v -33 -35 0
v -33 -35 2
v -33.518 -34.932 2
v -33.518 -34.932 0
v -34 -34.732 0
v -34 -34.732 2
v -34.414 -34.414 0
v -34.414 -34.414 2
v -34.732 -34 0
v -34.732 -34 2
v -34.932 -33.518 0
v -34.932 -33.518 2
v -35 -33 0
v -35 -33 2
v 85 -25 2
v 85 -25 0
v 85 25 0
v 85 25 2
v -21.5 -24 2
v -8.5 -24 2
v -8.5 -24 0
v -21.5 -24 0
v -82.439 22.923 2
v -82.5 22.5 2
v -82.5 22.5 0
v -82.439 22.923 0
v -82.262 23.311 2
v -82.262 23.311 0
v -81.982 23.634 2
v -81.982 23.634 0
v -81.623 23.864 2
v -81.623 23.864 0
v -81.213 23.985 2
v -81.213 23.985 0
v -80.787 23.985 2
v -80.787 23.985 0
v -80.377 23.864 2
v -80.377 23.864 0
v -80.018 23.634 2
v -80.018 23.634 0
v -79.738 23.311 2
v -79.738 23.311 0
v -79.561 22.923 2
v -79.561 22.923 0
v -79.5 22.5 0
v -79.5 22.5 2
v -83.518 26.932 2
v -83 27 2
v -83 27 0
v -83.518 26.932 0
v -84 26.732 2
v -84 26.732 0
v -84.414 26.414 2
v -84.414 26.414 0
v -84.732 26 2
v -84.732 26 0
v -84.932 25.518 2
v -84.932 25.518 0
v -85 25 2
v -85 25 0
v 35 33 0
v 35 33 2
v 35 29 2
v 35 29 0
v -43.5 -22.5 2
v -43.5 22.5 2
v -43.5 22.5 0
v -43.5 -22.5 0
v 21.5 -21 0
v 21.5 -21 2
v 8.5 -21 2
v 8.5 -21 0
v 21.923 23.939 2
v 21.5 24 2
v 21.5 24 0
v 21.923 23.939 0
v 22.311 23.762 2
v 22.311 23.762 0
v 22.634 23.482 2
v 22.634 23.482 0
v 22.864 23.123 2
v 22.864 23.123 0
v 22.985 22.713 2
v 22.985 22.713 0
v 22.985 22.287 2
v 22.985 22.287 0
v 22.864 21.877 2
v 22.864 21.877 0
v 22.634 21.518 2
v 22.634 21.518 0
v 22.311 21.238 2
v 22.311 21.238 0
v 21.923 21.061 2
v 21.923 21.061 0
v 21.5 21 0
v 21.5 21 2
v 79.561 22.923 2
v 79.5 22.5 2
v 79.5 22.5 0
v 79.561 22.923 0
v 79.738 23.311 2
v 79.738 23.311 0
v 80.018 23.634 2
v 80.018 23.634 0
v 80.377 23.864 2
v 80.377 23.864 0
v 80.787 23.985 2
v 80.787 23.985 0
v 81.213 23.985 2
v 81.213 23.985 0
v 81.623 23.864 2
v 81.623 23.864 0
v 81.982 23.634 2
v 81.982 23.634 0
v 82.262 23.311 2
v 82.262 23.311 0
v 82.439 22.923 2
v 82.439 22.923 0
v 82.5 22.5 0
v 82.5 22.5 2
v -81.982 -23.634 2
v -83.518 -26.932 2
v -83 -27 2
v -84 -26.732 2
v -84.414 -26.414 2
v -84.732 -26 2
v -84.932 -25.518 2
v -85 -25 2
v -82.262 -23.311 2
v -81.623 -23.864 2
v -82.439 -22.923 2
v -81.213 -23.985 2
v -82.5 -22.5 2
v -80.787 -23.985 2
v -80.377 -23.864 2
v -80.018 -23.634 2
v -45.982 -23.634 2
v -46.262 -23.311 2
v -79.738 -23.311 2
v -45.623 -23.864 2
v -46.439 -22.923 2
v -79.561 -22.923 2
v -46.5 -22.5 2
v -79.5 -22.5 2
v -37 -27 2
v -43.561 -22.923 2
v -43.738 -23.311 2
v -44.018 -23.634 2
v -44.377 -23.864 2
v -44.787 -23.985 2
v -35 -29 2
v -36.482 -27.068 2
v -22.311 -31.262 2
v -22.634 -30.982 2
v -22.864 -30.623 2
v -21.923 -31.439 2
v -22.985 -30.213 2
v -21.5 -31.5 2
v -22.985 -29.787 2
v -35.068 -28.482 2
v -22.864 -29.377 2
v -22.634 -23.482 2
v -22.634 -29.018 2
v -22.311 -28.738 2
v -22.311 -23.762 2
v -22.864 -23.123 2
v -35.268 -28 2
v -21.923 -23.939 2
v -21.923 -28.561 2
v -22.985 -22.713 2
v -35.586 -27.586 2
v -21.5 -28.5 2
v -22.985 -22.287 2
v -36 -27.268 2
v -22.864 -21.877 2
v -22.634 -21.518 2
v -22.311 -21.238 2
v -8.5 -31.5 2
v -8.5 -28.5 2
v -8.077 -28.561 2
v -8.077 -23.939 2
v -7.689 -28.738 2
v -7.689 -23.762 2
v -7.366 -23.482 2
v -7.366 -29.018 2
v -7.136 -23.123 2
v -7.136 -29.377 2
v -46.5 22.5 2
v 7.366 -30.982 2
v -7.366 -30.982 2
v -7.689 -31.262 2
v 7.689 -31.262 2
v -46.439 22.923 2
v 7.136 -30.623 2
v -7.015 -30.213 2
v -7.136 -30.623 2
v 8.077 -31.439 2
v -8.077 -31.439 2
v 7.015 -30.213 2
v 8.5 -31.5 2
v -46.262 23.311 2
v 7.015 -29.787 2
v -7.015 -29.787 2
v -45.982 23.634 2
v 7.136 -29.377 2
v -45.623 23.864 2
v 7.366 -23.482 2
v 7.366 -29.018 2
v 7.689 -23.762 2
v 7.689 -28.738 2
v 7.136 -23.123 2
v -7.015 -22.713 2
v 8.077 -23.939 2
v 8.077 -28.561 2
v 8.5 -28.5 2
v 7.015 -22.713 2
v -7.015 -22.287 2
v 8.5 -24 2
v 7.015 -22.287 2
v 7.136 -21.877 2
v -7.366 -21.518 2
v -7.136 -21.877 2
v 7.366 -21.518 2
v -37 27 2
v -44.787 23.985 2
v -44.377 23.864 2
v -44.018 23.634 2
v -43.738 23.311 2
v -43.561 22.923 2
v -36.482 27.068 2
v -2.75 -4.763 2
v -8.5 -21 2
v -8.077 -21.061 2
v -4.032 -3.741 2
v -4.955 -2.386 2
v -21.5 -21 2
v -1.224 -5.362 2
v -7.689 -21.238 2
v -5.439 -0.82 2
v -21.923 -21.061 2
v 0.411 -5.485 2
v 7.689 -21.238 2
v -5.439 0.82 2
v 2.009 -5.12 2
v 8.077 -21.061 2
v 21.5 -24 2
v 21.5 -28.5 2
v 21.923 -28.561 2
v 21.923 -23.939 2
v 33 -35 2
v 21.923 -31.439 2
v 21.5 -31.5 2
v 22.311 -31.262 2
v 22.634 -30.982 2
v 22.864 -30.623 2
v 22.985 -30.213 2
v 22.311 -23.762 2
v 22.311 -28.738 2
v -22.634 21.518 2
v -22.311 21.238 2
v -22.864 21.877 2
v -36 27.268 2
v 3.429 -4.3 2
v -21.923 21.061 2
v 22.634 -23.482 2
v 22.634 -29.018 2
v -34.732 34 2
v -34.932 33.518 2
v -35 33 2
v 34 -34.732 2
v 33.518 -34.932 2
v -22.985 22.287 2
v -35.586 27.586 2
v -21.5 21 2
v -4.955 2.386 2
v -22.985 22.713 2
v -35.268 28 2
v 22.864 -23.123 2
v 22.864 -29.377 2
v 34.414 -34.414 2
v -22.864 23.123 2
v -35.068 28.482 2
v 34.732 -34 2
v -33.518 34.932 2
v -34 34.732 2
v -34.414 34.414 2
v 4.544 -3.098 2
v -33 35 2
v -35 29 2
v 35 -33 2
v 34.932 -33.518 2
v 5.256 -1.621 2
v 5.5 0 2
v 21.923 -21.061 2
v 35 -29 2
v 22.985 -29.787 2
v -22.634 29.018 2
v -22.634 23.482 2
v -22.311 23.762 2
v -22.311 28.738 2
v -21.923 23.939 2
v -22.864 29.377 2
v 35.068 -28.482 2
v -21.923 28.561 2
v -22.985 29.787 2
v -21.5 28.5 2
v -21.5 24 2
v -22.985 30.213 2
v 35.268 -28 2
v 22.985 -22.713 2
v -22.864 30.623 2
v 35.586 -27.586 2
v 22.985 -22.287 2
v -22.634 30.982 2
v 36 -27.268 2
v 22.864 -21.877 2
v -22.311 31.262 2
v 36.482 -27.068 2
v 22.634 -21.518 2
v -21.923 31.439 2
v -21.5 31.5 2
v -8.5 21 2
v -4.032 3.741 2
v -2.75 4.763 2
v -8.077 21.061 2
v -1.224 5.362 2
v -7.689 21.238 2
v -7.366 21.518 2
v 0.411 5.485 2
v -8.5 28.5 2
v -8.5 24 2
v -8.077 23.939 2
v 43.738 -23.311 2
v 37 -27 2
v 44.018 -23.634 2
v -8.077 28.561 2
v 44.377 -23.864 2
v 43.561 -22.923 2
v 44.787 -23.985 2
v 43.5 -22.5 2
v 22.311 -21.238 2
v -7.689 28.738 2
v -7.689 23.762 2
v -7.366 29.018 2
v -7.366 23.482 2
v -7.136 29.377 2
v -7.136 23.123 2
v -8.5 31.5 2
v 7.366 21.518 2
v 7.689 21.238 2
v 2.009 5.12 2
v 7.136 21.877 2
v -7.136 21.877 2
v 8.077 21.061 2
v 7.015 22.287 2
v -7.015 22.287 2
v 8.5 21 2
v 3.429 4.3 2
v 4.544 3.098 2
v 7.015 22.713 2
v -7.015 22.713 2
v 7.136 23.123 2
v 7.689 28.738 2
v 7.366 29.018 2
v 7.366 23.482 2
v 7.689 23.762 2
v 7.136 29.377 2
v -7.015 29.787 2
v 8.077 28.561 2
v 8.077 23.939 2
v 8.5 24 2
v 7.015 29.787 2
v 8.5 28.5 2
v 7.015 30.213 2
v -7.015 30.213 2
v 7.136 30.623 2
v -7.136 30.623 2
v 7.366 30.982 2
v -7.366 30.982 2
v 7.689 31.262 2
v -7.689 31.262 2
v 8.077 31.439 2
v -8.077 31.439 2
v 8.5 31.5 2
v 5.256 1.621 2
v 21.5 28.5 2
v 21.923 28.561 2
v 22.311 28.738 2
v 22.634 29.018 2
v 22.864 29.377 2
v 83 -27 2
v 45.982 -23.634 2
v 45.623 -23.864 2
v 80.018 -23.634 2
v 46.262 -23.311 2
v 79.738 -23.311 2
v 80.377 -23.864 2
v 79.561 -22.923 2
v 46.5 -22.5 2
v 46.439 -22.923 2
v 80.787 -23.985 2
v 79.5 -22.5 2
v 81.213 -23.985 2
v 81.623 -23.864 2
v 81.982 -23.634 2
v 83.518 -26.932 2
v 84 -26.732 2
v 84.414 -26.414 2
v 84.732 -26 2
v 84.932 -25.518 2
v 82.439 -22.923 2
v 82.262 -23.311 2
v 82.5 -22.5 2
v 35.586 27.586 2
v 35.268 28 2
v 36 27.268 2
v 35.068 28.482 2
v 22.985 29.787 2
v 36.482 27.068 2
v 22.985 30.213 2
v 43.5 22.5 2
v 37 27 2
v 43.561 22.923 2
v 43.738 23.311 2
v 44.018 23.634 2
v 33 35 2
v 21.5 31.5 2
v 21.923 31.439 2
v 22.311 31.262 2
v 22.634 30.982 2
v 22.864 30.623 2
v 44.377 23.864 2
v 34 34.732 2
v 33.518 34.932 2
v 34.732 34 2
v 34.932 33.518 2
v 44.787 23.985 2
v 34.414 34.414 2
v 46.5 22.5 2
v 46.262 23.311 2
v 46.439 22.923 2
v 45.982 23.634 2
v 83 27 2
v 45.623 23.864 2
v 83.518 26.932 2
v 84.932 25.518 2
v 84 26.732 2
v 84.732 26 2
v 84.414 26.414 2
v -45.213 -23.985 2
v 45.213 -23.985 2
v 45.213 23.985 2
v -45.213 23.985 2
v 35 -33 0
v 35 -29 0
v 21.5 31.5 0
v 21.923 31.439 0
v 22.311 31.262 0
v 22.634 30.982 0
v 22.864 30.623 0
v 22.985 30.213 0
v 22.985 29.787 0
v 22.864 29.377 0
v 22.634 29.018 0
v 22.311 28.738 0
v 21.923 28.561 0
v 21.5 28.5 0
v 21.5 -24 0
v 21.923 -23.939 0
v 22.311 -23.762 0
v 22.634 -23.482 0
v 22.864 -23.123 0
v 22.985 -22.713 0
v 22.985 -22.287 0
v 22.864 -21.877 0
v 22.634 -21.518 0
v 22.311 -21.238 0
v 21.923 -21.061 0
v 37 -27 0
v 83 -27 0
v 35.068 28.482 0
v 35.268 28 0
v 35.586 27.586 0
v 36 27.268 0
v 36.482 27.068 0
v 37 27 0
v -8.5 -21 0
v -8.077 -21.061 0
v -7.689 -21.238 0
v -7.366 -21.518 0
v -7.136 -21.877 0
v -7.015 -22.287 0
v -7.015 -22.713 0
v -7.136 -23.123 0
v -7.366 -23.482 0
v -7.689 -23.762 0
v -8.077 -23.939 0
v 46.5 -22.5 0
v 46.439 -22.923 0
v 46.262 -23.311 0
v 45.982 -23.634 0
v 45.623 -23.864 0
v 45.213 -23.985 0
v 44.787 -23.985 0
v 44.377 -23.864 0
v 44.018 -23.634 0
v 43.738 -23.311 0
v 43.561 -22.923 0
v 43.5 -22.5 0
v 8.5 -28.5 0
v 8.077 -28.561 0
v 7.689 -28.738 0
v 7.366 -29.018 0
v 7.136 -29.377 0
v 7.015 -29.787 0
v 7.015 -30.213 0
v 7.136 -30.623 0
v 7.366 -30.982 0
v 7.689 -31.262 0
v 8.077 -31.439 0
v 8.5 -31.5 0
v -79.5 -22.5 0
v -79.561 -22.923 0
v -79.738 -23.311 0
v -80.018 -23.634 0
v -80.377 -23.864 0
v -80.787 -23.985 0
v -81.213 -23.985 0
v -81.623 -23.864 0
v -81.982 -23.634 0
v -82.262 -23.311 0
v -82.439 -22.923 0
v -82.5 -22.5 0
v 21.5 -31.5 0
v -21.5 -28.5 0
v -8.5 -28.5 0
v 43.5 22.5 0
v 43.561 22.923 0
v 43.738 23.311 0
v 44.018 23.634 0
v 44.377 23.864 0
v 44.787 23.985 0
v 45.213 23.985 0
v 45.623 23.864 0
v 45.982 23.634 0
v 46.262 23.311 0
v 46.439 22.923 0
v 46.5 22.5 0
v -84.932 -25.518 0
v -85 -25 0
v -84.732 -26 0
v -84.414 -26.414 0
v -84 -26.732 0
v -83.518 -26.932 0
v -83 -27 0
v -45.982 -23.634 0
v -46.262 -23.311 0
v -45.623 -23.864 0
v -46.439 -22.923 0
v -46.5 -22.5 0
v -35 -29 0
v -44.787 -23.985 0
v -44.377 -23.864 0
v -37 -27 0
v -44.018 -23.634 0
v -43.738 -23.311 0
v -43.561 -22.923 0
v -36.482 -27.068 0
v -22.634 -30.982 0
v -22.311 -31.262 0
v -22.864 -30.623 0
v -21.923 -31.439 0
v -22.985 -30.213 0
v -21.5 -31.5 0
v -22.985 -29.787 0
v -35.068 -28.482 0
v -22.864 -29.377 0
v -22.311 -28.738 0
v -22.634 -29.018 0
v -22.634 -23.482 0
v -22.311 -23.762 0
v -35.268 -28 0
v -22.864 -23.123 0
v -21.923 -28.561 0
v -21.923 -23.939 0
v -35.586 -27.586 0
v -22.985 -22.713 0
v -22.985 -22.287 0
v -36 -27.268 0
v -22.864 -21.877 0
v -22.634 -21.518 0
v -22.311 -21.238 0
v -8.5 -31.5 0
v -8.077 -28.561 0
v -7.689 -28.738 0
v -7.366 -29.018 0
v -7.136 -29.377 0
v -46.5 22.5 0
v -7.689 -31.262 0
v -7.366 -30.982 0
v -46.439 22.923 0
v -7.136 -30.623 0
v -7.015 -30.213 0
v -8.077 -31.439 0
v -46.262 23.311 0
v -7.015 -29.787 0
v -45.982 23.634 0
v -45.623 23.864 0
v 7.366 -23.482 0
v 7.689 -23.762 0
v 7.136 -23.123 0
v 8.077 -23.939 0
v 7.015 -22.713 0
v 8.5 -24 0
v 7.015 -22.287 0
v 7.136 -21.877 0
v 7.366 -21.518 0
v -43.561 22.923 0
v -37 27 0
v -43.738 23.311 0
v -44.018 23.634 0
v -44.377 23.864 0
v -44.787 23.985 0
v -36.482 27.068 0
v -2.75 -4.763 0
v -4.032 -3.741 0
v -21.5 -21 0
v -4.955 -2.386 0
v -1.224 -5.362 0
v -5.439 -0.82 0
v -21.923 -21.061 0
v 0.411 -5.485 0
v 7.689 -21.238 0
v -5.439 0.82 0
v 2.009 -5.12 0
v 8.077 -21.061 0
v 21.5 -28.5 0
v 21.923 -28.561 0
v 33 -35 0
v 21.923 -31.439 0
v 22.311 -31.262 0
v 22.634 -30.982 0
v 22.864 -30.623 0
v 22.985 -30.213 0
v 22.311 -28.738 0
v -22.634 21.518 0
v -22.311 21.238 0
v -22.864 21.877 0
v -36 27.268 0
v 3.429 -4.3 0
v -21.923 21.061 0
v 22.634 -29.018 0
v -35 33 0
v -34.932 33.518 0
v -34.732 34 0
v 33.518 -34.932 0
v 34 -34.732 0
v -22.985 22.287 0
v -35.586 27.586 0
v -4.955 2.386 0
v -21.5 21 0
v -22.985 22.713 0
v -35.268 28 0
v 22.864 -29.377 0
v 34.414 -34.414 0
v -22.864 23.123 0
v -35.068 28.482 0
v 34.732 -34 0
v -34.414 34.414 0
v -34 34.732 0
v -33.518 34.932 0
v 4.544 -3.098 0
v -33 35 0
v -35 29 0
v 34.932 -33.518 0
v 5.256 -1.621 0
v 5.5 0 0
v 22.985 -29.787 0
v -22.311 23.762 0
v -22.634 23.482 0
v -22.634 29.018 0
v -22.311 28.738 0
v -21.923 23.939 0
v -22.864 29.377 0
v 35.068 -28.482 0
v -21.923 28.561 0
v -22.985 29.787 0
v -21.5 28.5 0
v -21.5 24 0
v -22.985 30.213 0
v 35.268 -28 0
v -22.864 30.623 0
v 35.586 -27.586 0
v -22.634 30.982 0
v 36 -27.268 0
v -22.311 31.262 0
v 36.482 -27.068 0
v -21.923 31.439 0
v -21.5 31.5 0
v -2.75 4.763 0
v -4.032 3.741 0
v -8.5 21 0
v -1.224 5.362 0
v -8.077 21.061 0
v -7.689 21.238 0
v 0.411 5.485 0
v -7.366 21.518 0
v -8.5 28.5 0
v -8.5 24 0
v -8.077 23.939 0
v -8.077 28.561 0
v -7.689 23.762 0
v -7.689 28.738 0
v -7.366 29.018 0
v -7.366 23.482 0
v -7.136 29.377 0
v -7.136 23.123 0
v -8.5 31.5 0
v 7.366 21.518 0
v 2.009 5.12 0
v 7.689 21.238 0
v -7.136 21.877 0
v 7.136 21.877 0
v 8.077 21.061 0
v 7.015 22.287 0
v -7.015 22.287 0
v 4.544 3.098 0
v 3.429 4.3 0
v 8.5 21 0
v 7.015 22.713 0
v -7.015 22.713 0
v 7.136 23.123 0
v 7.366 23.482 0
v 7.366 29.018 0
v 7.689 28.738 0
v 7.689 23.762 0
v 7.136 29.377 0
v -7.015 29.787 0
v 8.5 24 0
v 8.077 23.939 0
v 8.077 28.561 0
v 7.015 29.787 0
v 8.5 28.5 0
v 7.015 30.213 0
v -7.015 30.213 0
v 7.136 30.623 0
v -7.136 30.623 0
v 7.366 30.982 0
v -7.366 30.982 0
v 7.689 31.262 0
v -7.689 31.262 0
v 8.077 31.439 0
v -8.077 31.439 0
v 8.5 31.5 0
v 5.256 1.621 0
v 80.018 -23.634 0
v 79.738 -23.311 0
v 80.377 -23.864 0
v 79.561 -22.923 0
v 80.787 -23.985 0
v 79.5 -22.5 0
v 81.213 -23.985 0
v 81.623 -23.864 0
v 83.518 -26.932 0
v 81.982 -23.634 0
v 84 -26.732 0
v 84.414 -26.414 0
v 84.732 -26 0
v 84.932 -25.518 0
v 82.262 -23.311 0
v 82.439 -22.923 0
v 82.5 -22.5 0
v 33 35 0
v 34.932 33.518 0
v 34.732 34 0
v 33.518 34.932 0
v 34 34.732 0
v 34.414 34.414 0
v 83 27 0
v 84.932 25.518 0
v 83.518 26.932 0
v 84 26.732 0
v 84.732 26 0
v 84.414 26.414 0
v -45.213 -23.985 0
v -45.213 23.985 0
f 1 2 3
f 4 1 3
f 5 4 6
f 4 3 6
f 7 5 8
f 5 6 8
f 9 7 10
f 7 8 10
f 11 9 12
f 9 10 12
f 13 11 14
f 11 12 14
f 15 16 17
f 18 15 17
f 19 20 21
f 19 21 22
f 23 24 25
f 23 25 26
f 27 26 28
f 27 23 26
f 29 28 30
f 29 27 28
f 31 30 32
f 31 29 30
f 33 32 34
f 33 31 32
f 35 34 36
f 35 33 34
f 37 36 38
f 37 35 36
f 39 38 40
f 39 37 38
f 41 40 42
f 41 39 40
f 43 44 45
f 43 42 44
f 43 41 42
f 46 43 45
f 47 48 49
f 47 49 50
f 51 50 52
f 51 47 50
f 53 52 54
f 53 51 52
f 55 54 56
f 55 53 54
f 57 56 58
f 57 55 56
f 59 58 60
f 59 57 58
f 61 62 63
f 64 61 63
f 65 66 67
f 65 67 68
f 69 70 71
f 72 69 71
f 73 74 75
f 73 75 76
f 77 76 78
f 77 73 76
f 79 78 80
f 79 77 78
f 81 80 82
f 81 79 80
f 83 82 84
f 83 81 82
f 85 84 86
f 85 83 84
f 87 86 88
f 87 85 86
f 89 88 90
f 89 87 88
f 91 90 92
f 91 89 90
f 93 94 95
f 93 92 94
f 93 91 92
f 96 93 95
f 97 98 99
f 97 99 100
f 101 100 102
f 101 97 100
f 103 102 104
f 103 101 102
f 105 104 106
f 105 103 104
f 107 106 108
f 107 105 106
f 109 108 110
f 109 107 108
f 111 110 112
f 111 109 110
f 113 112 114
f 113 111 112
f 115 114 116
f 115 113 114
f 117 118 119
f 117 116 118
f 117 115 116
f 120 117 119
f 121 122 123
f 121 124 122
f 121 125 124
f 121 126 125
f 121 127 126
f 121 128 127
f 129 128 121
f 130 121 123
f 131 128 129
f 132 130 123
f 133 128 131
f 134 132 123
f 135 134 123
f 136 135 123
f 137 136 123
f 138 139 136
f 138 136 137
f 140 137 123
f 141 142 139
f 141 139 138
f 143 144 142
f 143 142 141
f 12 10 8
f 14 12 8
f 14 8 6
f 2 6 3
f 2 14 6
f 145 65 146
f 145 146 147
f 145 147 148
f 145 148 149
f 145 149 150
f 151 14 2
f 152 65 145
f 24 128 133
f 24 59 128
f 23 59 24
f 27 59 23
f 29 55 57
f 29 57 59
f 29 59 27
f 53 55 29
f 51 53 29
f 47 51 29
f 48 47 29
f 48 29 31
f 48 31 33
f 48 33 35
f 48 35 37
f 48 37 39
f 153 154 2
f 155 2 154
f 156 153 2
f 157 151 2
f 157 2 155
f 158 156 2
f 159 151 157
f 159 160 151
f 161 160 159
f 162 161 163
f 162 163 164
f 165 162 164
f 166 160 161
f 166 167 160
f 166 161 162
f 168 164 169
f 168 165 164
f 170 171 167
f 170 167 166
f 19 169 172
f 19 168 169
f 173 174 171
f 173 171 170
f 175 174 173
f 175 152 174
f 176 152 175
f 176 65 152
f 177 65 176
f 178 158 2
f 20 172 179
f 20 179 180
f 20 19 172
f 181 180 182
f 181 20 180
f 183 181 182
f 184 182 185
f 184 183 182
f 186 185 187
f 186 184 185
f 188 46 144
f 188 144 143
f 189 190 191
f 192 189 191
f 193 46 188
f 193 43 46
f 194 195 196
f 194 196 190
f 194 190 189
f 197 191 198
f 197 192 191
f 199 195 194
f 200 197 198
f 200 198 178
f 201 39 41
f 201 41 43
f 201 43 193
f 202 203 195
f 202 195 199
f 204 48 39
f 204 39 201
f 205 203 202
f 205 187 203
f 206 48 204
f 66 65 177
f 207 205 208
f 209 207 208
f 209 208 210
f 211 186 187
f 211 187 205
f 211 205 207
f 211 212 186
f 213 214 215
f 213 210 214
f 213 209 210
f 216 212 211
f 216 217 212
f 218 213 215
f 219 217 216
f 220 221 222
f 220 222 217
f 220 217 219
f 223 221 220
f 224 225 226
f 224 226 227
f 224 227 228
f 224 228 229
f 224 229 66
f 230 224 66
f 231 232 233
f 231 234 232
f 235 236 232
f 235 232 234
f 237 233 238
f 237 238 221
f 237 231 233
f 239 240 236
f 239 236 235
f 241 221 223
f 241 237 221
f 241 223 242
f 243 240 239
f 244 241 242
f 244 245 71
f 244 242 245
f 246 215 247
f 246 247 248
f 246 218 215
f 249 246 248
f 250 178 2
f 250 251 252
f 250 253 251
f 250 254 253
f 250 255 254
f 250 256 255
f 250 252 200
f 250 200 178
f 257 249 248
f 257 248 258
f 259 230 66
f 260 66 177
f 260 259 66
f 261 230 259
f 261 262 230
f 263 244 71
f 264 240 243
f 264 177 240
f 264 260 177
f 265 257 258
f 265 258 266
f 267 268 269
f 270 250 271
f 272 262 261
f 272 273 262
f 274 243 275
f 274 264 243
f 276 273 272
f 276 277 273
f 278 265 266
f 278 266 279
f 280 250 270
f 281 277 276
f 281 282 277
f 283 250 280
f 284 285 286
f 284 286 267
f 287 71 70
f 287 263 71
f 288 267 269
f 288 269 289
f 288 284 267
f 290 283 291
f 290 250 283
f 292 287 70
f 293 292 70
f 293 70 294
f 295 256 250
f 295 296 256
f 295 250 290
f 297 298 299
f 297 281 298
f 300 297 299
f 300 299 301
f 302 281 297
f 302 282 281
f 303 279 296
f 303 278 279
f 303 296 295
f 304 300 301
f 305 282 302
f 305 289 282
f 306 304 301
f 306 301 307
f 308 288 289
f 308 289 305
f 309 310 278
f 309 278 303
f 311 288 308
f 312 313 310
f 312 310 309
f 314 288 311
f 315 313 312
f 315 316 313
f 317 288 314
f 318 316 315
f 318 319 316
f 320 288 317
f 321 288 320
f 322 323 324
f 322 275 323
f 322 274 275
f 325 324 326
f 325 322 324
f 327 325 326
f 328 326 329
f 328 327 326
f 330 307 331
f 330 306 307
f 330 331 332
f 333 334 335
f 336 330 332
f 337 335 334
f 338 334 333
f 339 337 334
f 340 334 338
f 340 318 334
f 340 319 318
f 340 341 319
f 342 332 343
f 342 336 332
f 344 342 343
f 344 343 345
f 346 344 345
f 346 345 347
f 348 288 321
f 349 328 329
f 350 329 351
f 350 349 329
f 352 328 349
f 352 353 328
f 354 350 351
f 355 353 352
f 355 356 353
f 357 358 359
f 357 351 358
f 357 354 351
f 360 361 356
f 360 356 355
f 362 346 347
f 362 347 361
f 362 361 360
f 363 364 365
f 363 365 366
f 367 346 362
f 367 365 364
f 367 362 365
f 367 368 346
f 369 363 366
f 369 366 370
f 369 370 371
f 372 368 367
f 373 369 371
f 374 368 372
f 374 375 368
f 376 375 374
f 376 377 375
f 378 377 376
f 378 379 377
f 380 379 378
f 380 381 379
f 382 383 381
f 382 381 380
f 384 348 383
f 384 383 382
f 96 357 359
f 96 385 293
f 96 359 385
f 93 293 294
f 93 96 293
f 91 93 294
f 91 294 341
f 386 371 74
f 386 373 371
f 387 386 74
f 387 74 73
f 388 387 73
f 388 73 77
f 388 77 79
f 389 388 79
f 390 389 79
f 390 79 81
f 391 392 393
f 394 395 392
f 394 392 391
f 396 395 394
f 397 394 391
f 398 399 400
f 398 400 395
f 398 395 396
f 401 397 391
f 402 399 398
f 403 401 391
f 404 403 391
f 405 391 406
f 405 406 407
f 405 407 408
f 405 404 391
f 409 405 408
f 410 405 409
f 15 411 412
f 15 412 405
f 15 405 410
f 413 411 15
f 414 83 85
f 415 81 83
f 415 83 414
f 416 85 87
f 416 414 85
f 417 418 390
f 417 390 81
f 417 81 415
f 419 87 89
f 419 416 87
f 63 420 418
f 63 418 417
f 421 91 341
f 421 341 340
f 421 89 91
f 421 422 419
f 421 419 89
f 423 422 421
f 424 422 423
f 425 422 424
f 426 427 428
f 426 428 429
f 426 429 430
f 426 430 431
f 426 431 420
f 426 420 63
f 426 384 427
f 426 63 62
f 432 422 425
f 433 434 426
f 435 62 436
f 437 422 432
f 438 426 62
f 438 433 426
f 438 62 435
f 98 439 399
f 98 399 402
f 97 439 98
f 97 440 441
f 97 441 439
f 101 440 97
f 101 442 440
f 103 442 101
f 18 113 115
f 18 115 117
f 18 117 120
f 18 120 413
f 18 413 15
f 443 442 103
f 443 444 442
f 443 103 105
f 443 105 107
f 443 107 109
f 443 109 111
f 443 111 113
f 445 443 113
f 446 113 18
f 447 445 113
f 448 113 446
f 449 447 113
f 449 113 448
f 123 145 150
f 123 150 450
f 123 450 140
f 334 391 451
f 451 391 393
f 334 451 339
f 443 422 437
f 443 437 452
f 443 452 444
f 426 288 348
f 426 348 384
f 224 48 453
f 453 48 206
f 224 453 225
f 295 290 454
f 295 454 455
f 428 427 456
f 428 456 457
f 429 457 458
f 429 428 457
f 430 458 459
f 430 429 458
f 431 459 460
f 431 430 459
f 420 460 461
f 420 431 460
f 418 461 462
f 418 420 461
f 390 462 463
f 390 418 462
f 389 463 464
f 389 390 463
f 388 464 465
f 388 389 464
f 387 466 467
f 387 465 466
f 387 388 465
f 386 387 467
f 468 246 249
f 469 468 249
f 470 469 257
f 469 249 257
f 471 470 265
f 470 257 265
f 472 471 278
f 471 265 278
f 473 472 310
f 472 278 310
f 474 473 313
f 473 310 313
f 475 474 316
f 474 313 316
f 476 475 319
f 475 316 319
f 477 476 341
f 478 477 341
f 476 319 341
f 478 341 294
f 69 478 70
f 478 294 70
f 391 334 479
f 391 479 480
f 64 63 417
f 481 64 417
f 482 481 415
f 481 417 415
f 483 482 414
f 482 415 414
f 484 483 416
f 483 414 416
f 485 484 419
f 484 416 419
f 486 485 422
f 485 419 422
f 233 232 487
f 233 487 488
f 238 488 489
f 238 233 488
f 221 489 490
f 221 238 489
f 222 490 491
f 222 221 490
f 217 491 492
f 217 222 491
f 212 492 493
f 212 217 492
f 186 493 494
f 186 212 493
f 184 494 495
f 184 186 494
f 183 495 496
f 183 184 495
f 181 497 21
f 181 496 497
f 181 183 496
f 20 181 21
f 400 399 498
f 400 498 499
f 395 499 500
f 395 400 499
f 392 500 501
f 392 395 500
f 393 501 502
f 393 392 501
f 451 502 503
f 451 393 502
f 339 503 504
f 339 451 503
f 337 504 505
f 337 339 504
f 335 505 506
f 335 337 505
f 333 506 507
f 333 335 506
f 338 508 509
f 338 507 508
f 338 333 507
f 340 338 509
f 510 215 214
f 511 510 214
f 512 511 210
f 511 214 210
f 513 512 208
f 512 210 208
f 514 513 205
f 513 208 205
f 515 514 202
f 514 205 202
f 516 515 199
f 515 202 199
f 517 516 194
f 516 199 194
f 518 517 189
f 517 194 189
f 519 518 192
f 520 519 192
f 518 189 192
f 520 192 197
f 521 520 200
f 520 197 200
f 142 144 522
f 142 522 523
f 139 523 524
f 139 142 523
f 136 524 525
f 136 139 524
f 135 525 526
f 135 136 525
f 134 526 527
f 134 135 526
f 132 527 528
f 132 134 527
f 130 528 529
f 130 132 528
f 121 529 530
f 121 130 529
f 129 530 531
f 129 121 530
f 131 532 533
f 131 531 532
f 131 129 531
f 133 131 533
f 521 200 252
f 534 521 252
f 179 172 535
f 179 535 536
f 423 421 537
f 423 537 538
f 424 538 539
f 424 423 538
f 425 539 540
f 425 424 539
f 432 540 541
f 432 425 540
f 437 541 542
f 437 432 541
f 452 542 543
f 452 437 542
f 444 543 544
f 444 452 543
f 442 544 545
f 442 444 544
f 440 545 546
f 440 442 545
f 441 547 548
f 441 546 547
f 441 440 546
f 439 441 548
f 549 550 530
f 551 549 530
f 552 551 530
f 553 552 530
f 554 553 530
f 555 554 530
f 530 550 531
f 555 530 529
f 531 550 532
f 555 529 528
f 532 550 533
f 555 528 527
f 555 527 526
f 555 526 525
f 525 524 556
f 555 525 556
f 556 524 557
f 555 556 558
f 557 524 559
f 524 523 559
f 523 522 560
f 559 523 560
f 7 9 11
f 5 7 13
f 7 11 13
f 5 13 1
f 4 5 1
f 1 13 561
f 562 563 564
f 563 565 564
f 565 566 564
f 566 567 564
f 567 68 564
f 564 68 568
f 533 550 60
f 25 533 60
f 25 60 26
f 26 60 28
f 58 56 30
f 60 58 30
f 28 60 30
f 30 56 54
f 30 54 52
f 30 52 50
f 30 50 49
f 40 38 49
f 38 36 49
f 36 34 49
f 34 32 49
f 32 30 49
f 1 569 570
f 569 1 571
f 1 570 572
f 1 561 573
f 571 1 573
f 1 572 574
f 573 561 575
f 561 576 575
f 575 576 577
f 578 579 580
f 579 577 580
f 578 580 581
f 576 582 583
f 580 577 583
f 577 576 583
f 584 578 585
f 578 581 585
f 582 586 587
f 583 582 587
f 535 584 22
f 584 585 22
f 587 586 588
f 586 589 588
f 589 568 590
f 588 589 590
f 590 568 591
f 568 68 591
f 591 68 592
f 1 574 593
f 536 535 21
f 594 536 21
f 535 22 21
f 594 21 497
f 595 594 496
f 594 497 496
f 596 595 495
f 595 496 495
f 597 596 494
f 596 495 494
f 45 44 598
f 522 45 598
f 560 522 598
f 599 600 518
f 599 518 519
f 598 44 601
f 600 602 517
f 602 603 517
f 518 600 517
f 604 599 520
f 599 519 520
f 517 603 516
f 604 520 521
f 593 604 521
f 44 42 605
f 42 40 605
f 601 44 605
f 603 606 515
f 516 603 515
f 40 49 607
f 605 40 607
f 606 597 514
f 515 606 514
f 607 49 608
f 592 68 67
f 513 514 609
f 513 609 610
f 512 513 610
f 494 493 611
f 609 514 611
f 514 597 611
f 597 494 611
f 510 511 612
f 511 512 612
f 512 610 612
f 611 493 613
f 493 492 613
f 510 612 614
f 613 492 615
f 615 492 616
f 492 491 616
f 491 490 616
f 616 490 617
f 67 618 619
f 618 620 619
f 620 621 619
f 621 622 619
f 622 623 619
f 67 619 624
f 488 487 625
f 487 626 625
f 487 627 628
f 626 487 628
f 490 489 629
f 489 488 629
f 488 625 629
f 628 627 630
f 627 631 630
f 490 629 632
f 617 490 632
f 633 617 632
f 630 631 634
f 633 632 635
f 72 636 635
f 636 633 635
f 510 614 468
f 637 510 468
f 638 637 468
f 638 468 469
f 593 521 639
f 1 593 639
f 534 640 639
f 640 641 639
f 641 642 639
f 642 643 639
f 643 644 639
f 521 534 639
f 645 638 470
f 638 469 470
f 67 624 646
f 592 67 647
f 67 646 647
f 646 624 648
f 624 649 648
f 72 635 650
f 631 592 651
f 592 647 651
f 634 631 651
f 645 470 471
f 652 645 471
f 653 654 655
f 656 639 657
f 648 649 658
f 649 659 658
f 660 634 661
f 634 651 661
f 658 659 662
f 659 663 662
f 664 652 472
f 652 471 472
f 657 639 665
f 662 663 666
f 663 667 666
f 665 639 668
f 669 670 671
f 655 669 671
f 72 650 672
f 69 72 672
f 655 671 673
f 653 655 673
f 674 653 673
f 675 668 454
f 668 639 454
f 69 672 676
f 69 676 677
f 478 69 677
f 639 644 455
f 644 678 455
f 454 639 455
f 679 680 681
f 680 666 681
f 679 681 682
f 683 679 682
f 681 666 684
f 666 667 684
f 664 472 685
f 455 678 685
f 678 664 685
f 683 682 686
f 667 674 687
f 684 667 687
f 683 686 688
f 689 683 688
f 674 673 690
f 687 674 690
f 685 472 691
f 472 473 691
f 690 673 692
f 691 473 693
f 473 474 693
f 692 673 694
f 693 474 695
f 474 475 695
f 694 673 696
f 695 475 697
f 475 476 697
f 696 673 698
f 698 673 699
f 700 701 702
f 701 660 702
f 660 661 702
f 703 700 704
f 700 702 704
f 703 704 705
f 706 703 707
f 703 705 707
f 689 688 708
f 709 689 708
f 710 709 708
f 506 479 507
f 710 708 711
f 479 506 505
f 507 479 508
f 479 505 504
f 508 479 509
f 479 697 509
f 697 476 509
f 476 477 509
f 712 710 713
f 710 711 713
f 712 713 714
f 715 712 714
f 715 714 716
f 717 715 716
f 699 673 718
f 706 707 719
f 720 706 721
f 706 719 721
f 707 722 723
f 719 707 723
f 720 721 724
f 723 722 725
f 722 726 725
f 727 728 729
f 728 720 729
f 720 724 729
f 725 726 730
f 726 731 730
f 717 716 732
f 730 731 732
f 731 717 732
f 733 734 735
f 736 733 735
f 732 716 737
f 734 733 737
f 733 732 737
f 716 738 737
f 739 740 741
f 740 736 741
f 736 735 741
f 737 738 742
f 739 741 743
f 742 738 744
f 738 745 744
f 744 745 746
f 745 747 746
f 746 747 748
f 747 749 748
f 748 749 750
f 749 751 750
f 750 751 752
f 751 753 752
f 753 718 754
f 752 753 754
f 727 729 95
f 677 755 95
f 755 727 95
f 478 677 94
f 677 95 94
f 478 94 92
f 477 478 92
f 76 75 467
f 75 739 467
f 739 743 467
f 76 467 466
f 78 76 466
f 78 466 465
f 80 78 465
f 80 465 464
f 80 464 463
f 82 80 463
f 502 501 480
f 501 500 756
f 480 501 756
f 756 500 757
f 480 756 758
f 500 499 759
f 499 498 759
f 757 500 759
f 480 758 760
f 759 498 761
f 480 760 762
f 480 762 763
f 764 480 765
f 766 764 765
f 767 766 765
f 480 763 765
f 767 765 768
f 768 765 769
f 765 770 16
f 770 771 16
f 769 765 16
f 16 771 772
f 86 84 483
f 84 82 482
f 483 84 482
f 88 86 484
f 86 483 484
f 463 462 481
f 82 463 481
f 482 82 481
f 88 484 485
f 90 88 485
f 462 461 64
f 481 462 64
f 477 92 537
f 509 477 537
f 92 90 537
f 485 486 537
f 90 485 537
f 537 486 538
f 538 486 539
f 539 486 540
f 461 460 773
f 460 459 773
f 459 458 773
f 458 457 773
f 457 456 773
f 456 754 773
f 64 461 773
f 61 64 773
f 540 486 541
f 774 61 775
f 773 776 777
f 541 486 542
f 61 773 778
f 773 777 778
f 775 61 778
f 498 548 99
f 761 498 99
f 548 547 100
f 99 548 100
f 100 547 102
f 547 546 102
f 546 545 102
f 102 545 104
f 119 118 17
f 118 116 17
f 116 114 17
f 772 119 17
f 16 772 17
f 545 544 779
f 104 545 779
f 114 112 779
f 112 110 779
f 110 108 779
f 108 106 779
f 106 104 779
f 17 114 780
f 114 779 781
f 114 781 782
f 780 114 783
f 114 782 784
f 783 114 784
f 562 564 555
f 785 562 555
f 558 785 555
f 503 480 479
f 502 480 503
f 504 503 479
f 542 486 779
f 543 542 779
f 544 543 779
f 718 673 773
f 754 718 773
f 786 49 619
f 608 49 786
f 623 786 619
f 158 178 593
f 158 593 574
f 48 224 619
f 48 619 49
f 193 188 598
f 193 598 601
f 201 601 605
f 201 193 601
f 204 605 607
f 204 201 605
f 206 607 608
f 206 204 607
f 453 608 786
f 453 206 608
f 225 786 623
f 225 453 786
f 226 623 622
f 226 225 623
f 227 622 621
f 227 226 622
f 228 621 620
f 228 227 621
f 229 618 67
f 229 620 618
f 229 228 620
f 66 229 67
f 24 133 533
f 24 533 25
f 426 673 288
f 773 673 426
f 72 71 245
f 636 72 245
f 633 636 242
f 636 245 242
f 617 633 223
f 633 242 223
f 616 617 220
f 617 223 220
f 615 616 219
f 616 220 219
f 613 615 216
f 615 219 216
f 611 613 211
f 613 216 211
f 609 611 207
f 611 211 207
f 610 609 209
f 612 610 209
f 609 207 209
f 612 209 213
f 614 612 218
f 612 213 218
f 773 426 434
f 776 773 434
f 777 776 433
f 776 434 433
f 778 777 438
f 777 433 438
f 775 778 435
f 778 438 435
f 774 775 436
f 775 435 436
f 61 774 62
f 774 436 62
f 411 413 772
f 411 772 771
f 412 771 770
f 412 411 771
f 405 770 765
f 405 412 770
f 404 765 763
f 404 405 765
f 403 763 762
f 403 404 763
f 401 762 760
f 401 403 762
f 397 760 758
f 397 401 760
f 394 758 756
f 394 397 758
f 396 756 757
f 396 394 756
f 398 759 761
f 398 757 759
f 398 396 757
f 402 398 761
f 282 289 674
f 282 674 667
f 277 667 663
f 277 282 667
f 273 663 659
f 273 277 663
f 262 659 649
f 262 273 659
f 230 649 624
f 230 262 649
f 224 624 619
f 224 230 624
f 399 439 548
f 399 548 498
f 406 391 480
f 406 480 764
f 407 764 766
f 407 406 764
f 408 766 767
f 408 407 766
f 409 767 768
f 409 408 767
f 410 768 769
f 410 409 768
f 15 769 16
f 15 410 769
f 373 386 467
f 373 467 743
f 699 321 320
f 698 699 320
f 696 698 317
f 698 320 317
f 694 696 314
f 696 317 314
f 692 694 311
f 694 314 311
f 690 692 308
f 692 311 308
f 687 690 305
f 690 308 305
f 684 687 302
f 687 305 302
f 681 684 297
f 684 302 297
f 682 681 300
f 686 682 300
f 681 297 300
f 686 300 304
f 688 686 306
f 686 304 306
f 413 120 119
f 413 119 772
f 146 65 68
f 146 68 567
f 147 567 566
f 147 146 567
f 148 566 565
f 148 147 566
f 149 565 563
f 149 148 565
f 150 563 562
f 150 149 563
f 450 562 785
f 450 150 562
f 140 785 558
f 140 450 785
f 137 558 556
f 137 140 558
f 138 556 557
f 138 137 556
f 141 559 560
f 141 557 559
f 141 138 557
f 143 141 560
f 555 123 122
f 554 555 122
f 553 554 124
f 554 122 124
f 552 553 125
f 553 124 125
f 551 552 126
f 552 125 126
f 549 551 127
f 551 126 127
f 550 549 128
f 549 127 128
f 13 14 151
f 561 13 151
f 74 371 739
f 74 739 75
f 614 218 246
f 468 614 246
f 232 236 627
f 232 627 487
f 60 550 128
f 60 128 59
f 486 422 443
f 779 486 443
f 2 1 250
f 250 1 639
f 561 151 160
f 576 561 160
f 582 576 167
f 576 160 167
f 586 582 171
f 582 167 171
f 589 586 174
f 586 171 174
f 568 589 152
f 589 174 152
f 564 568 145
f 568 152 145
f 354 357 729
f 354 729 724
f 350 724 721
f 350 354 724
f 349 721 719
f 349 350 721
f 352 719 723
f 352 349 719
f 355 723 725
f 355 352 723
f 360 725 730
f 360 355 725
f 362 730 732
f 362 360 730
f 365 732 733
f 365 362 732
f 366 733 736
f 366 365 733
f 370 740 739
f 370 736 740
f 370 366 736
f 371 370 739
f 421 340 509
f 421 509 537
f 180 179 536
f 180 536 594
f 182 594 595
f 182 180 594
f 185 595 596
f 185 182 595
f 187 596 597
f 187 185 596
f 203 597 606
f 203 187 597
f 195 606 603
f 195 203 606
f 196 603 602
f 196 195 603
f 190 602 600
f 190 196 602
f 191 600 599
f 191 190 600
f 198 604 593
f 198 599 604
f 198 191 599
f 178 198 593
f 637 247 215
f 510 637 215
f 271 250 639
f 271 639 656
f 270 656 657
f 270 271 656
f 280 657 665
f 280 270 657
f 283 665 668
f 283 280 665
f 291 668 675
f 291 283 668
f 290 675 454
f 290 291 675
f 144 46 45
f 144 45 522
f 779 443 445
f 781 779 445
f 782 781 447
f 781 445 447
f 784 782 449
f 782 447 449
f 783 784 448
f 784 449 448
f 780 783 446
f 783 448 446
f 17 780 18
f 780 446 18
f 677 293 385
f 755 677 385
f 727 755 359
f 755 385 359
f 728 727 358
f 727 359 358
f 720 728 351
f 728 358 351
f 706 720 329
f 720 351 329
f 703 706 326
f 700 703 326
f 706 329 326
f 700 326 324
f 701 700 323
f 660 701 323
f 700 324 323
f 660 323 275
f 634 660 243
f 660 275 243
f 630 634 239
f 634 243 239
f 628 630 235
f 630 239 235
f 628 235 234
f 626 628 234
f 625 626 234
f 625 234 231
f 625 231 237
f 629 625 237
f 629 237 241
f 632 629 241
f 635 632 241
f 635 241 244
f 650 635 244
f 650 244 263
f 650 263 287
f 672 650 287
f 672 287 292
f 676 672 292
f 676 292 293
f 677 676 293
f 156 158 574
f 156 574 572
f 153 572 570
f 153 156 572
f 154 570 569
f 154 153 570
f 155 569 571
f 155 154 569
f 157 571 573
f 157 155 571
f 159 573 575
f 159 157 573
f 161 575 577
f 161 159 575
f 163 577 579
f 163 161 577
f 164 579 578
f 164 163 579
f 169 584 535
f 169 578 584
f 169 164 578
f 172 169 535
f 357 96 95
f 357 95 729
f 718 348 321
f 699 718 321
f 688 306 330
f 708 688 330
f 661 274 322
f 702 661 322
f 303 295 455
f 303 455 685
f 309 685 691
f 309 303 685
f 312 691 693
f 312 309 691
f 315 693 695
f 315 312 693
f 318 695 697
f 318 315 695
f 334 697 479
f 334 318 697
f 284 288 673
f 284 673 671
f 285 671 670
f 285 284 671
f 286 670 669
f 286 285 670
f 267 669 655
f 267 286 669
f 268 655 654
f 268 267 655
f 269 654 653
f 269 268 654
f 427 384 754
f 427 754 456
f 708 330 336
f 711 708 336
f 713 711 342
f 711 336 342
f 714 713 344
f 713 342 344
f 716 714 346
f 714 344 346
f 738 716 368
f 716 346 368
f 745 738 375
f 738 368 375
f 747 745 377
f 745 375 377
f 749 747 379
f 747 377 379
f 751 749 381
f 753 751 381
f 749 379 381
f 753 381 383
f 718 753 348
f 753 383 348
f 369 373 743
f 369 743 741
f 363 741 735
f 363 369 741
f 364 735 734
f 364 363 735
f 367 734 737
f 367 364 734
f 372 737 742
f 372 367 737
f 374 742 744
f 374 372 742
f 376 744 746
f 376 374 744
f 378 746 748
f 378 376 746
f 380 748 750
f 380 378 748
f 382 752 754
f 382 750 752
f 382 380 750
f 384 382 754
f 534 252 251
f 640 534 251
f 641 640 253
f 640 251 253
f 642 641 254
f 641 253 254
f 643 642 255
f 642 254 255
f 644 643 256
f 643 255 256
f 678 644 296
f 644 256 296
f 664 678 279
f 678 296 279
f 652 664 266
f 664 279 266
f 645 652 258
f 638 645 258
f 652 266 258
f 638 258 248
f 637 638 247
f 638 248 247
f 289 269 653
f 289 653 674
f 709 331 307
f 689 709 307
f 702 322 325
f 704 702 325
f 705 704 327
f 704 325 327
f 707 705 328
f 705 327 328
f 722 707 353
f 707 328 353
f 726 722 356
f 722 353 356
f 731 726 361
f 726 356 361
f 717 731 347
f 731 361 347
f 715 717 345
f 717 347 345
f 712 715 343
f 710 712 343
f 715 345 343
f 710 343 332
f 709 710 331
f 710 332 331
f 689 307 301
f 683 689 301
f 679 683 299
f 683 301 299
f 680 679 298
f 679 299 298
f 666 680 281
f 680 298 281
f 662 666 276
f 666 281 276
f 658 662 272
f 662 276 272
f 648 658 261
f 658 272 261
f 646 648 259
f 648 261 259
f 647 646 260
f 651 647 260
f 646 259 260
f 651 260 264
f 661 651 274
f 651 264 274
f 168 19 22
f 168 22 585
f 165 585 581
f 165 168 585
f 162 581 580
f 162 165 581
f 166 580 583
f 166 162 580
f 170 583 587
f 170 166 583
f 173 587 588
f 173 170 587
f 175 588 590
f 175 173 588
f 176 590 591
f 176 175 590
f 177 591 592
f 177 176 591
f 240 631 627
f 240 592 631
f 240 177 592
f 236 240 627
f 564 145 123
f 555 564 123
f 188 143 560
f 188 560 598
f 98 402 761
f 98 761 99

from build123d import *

# Parameters (mm, degrees)
SKETCH_1_W          = 170
SKETCH_1_H          = 70
EXTRUDE_1_DEPTH     = 2
SKETCH_2_R          = 5.5
CUT_EXTRUDE_1_DEPTH = 92.945636112
CUT_EXTRUDE_2_DEPTH = 92.945636112


with BuildPart() as part:
    # 草圖1 → 填料-伸長1 (new body)
    with BuildSketch(Plane.XY):
        Rectangle(SKETCH_1_W, SKETCH_1_H)
    extrude(amount=EXTRUDE_1_DEPTH)

    # 草圖2 → 除料-伸長1 (cut, through all)
    with BuildSketch(Plane.XY.offset(2)):
        Circle(SKETCH_2_R)
        with BuildLine():
            Line((43.5, -22.5), (43.5, 22.5))
            ThreePointArc((43.5, 22.5), (45, 24), (46.5, 22.5))
            Line((46.5, 22.5), (46.5, -22.5))
            ThreePointArc((46.5, -22.5), (45, -24), (43.5, -22.5))
        make_face()
        with BuildLine():
            Line((-46.5, -22.5), (-46.5, 22.5))
            ThreePointArc((-46.5, 22.5), (-45, 24), (-43.5, 22.5))
            Line((-43.5, 22.5), (-43.5, -22.5))
            ThreePointArc((-43.5, -22.5), (-45, -24), (-46.5, -22.5))
        make_face()
        with BuildLine():
            Line((21.5, 28.5), (8.5, 28.5))
            ThreePointArc((8.5, 28.5), (7, 30), (8.5, 31.5))
            Line((8.5, 31.5), (21.5, 31.5))
            ThreePointArc((21.5, 31.5), (23, 30), (21.5, 28.5))
        make_face()
        with BuildLine():
            Line((-82.5, -22.5), (-82.5, 22.5))
            ThreePointArc((-82.5, 22.5), (-81, 24), (-79.5, 22.5))
            Line((-79.5, 22.5), (-79.5, -22.5))
            ThreePointArc((-79.5, -22.5), (-81, -24), (-82.5, -22.5))
        make_face()
        with BuildLine():
            Line((79.5, -22.5), (79.5, 22.5))
            ThreePointArc((79.5, 22.5), (81, 24), (82.5, 22.5))
            Line((82.5, 22.5), (82.5, -22.5))
            ThreePointArc((82.5, -22.5), (81, -24), (79.5, -22.5))
        make_face()
        with BuildLine():
            Line((21.5, 21), (8.5, 21))
            ThreePointArc((8.5, 21), (7, 22.5), (8.5, 24))
            Line((8.5, 24), (21.5, 24))
            ThreePointArc((21.5, 24), (23, 22.5), (21.5, 21))
        make_face()
        with BuildLine():
            Line((-21.5, 28.5), (-8.5, 28.5))
            ThreePointArc((-8.5, 28.5), (-7, 30), (-8.5, 31.5))
            Line((-8.5, 31.5), (-21.5, 31.5))
            ThreePointArc((-21.5, 31.5), (-23, 30), (-21.5, 28.5))
        make_face()
        with BuildLine():
            Line((-21.5, 21), (-8.5, 21))
            ThreePointArc((-8.5, 21), (-7, 22.5), (-8.5, 24))
            Line((-8.5, 24), (-21.5, 24))
            ThreePointArc((-21.5, 24), (-23, 22.5), (-21.5, 21))
        make_face()
        with BuildLine():
            Line((21.5, -28.5), (8.5, -28.5))
            ThreePointArc((8.5, -28.5), (7, -30), (8.5, -31.5))
            Line((8.5, -31.5), (21.5, -31.5))
            ThreePointArc((21.5, -31.5), (23, -30), (21.5, -28.5))
        make_face()
        with BuildLine():
            Line((21.5, -21), (8.5, -21))
            ThreePointArc((8.5, -21), (7, -22.5), (8.5, -24))
            Line((8.5, -24), (21.5, -24))
            ThreePointArc((21.5, -24), (23, -22.5), (21.5, -21))
        make_face()
        with BuildLine():
            Line((-21.5, -28.5), (-8.5, -28.5))
            ThreePointArc((-8.5, -28.5), (-7, -30), (-8.5, -31.5))
            Line((-8.5, -31.5), (-21.5, -31.5))
            ThreePointArc((-21.5, -31.5), (-23, -30), (-21.5, -28.5))
        make_face()
        with BuildLine():
            Line((-21.5, -21), (-8.5, -21))
            ThreePointArc((-8.5, -21), (-7, -22.5), (-8.5, -24))
            Line((-8.5, -24), (-21.5, -24))
            ThreePointArc((-21.5, -24), (-23, -22.5), (-21.5, -21))
        make_face()
    extrude(amount=-CUT_EXTRUDE_1_DEPTH, mode=Mode.SUBTRACT)

    # 草圖4 → 除料-伸長2 (cut, through all)
    with BuildSketch(Plane.XY.offset(2)):
        with BuildLine():
            Line((85, 35), (33, 35))
            ThreePointArc((33, 35), (34.414213562, 34.414213562), (35, 33))
            Line((35, 33), (35, 29))
            ThreePointArc((35, 29), (35.585786438, 27.585786438), (37, 27))
            Line((37, 27), (83, 27))
            ThreePointArc((83, 27), (84.414213562, 26.414213562), (85, 25))
            Line((85, 25), (85, 35))
        make_face()
        with BuildLine():
            Line((35, -33), (35, -29))
            ThreePointArc((35, -29), (35.585786438, -27.585786438), (37, -27))
            Line((37, -27), (83, -27))
            ThreePointArc((83, -27), (84.414213562, -26.414213562), (85, -25))
            Line((85, -25), (85, -35))
            Line((85, -35), (33, -35))
            ThreePointArc((33, -35), (34.414213562, -34.414213562), (35, -33))
        make_face()
        with BuildLine():
            Line((-85, -35), (-33, -35))
            ThreePointArc((-33, -35), (-34.414213562, -34.414213562), (-35, -33))
            Line((-35, -33), (-35, -29))
            ThreePointArc((-35, -29), (-35.585786438, -27.585786438), (-37, -27))
            Line((-37, -27), (-83, -27))
            ThreePointArc((-83, -27), (-84.414213562, -26.414213562), (-85, -25))
            Line((-85, -25), (-85, -35))
        make_face()
        with BuildLine():
            Line((-35, 33), (-35, 29))
            ThreePointArc((-35, 29), (-35.585786438, 27.585786438), (-37, 27))
            Line((-37, 27), (-83, 27))
            ThreePointArc((-83, 27), (-84.414213562, 26.414213562), (-85, 25))
            Line((-85, 25), (-85, 35))
            Line((-85, 35), (-33, 35))
            ThreePointArc((-33, 35), (-34.414213562, 34.414213562), (-35, 33))
        make_face()
    extrude(amount=-CUT_EXTRUDE_2_DEPTH, mode=Mode.SUBTRACT)


solid = part.part
